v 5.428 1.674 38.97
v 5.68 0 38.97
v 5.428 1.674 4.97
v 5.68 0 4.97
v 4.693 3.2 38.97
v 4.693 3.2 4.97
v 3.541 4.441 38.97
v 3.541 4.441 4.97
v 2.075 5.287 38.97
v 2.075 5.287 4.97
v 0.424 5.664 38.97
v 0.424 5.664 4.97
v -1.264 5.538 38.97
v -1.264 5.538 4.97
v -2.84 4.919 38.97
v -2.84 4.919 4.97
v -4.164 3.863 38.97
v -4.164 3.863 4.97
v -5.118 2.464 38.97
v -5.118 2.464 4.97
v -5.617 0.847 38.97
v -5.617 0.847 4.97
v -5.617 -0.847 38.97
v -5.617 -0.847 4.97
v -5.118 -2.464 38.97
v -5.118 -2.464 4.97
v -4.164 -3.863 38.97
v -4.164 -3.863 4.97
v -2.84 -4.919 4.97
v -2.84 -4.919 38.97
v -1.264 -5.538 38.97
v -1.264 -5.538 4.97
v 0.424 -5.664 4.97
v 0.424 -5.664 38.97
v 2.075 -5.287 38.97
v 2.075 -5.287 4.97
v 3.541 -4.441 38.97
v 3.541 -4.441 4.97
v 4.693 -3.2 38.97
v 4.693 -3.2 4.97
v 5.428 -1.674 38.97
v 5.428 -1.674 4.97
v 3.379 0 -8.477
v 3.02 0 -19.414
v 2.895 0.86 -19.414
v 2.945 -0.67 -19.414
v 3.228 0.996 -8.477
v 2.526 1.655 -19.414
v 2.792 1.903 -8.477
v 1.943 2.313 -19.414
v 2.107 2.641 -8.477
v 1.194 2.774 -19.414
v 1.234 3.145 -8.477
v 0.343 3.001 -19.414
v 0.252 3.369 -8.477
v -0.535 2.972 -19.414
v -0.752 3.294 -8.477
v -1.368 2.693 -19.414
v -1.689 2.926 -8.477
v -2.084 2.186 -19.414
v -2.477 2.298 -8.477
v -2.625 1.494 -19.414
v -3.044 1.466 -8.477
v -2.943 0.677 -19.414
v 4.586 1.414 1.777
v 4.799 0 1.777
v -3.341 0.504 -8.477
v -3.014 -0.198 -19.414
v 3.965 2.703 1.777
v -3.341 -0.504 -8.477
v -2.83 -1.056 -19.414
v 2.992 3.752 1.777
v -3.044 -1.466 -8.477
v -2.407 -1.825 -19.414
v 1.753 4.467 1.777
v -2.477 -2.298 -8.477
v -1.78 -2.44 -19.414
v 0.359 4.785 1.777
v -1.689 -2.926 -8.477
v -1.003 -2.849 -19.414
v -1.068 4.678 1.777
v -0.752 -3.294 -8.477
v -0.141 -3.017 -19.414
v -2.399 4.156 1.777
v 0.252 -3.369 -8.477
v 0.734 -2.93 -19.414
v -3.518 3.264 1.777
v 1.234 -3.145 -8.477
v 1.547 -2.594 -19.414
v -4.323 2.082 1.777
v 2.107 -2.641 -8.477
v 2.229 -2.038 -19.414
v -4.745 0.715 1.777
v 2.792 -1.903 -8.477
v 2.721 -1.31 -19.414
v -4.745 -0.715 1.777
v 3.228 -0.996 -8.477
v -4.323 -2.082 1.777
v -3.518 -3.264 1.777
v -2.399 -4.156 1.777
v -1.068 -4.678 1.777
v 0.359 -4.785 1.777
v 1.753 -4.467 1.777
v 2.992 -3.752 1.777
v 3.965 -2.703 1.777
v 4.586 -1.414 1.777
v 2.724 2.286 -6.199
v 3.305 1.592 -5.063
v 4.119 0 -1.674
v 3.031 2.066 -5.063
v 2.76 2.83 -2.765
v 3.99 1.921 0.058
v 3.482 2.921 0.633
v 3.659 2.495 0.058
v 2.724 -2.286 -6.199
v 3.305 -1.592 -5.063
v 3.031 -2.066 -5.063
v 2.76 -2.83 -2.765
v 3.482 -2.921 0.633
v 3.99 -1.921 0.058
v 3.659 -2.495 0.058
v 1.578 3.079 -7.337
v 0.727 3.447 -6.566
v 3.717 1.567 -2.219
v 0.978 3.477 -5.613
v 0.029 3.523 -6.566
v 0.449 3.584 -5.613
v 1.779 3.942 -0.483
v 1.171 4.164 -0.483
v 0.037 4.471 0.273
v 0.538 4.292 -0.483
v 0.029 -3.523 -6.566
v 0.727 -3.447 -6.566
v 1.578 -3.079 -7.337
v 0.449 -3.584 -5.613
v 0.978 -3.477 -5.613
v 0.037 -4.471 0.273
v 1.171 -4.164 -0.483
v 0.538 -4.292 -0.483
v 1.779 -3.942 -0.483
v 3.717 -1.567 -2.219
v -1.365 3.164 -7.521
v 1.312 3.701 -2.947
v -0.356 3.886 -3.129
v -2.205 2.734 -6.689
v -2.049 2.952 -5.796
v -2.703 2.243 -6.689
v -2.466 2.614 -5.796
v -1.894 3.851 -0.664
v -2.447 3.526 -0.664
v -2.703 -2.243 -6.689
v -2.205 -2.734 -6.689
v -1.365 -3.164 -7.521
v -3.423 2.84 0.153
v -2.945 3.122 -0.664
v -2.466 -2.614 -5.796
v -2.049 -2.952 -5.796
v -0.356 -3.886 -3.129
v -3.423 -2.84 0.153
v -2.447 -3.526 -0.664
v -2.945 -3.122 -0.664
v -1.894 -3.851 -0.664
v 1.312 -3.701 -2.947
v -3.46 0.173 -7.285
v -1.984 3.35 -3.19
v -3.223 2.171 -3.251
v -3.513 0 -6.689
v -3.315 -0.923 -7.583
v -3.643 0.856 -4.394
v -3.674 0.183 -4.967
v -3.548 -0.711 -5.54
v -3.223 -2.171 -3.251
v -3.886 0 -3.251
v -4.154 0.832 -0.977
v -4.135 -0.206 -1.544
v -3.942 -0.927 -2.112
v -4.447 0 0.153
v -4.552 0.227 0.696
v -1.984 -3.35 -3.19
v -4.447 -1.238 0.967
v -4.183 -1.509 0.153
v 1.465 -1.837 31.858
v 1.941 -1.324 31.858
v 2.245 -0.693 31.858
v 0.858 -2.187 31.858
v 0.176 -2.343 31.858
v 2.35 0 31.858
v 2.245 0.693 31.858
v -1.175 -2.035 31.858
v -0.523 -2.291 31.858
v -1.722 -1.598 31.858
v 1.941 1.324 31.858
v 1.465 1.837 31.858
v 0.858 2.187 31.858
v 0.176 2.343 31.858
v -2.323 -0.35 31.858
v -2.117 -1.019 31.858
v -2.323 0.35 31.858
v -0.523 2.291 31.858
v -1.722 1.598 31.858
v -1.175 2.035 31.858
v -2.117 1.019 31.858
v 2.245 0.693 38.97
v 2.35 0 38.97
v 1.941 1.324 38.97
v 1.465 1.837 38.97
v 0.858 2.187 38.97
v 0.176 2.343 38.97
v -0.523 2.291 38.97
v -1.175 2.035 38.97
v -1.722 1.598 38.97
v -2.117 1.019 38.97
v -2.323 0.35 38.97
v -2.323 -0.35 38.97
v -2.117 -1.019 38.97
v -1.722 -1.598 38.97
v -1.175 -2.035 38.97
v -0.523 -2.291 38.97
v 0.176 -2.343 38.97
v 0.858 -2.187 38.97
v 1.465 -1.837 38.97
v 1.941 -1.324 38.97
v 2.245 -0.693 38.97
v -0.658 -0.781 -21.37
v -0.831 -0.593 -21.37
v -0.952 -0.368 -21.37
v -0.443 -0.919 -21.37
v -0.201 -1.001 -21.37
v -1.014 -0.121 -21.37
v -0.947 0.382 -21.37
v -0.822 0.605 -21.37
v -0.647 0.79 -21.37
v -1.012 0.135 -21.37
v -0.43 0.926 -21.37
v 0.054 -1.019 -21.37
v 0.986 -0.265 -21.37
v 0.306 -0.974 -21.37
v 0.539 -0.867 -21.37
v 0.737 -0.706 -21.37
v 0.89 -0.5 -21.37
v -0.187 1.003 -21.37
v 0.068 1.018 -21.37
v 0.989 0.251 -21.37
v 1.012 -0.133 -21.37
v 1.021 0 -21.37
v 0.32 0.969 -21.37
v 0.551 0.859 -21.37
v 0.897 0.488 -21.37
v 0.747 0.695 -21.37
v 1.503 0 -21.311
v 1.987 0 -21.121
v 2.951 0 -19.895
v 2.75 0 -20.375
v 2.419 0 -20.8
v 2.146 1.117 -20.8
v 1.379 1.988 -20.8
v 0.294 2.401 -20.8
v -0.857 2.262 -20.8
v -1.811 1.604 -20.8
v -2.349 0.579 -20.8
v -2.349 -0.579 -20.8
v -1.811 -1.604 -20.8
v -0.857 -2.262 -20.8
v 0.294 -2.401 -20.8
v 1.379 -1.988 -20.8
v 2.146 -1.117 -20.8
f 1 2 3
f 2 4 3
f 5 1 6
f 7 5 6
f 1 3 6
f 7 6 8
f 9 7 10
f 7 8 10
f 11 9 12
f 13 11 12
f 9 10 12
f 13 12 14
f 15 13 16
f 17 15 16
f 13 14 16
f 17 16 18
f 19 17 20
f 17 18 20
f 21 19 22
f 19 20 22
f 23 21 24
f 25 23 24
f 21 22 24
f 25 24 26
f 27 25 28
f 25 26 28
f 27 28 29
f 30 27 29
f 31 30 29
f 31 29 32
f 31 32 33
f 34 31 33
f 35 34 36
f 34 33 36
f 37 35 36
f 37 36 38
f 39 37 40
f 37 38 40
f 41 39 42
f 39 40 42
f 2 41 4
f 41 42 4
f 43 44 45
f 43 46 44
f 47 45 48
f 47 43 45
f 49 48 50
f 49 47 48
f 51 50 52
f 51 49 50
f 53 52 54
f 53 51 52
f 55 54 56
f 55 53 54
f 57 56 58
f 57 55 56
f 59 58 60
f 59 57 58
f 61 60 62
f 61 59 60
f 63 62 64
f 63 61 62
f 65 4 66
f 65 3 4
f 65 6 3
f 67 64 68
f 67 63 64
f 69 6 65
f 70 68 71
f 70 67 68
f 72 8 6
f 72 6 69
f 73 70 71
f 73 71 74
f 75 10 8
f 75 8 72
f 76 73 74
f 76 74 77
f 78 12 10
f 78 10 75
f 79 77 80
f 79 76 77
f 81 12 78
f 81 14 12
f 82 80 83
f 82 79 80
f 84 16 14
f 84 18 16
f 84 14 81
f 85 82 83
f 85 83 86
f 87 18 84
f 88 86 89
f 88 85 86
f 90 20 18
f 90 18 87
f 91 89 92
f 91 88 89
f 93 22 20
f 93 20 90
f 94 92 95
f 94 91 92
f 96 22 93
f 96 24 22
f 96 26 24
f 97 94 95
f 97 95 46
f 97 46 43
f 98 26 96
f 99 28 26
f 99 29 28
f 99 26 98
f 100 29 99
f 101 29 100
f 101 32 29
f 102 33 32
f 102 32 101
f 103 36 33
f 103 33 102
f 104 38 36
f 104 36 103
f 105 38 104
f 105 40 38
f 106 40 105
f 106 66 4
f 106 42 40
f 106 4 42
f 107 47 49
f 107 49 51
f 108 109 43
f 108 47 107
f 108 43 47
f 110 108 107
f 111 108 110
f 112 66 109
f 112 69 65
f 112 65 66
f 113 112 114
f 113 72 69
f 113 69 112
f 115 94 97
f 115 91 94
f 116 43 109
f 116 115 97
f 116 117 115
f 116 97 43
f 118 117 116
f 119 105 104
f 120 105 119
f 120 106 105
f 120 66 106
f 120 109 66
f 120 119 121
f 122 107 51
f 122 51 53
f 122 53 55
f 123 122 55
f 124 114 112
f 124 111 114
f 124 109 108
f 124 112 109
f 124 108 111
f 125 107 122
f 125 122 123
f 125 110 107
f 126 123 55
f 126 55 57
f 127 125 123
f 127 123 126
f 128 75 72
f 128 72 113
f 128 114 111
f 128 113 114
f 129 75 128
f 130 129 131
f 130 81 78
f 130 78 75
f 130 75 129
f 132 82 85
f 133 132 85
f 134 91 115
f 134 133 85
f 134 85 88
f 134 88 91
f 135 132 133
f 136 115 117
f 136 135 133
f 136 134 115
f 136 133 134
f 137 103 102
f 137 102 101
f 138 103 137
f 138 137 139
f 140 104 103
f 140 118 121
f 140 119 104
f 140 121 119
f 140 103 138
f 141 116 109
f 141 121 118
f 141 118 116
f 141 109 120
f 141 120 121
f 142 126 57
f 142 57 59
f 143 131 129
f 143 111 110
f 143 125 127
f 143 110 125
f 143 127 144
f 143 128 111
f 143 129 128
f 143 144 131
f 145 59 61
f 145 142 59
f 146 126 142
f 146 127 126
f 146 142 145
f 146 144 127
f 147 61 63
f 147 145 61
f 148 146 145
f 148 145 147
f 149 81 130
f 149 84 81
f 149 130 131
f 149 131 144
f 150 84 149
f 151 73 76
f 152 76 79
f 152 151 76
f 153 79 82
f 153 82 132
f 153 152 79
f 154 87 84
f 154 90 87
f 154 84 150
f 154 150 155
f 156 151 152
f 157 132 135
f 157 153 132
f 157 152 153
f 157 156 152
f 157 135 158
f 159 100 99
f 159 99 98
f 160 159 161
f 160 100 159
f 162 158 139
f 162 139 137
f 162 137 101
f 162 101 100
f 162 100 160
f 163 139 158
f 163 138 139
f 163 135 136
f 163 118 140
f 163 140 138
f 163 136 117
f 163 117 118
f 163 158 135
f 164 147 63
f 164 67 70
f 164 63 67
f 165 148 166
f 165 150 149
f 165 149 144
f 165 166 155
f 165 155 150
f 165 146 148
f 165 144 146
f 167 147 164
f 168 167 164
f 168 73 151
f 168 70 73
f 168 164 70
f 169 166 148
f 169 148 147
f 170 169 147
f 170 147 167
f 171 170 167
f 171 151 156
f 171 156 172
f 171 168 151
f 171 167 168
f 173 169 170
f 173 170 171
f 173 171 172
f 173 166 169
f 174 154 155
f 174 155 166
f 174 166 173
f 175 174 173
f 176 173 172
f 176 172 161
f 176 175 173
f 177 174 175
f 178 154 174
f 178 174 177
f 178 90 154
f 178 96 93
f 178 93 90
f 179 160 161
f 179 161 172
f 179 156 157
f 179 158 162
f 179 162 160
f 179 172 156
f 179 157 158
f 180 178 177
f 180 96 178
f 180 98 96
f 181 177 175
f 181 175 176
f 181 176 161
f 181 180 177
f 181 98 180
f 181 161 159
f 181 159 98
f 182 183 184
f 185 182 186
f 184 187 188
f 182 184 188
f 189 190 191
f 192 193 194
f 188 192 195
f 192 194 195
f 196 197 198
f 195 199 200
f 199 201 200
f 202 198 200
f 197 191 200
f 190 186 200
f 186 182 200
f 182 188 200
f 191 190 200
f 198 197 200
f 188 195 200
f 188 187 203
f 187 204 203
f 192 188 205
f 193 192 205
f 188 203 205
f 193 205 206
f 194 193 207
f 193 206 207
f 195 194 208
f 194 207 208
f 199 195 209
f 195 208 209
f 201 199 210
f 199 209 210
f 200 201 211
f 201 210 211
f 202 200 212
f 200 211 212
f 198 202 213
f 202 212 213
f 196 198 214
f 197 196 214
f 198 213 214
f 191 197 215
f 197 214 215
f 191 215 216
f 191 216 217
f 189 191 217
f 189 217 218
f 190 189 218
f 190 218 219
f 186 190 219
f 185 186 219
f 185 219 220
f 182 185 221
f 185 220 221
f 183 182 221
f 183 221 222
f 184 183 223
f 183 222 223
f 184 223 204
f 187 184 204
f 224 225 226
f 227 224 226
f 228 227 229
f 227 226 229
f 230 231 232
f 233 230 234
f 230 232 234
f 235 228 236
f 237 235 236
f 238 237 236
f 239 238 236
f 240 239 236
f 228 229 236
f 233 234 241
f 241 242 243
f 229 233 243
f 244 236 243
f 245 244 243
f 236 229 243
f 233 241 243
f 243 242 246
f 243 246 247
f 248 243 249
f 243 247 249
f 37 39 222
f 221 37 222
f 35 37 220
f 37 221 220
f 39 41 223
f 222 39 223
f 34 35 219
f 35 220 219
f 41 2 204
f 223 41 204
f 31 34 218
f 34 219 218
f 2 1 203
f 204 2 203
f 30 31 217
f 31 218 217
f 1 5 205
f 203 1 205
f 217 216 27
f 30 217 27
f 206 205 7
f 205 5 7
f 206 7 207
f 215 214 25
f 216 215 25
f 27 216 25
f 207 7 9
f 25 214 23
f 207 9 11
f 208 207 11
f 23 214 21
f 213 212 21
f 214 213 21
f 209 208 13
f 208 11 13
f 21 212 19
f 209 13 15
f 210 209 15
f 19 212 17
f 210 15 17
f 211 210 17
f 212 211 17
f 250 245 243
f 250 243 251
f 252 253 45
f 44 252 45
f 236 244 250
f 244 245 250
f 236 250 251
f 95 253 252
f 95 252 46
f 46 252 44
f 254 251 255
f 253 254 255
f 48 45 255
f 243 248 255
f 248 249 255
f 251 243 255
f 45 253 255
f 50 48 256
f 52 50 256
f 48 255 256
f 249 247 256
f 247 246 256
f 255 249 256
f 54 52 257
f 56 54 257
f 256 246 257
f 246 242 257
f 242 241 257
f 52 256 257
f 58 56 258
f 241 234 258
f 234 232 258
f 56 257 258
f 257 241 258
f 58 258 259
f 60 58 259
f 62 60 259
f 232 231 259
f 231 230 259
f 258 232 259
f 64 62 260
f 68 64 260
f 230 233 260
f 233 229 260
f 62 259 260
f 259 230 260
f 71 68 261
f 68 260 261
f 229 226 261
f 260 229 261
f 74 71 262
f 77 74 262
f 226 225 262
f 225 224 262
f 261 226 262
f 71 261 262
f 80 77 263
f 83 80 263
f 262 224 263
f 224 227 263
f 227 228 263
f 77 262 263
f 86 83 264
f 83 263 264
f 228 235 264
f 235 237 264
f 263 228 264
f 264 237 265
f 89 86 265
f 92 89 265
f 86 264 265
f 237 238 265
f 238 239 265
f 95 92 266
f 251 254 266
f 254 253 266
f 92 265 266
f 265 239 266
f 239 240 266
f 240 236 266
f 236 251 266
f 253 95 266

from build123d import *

# Parameters (mm, degrees)
FILLET1_R = 2


with BuildPart() as part:
    # Sketch1 → Revolve1 (revolve)
    with BuildSketch(Plane(origin=(0, 0, 0), x_dir=(1, 0, 0), z_dir=(0, 1, 0))):
        with BuildLine():
            Line((2.971015201, 21.369872107), (0, 21.369872107))
            Line((0, 21.369872107), (0, -31.857927965))
            Line((0, -31.857927965), (2.3495, -31.857927965))
            Line((2.3495, -31.857927965), (2.3495, -38.969927965))
            Line((2.3495, -38.969927965), (5.679999851, -38.969927965))
            Line((5.679999851, -38.969927965), (5.679999851, -4.969927893))
            add(Edge.make_bspline(
                [(2.971015201, 21.369872107), (3.222459796, 12.63958567), (2.971347644, 3.491126919), (5.679999851, -4.969927893)],
                knots=[0, 0, 0, 0, 1, 1, 1, 1], degree=3))
        make_face()
    revolve(axis=Axis((0, 0, -21.369872107), (0, 0, 1)))

    # Fillet1
    fillet1_edges = [part.edges().sort_by_distance(p)[0] for p in [
        (-2.971015201, 0, -21.369872107),
    ]]
    fillet(fillet1_edges, radius=FILLET1_R)


solid = part.part
